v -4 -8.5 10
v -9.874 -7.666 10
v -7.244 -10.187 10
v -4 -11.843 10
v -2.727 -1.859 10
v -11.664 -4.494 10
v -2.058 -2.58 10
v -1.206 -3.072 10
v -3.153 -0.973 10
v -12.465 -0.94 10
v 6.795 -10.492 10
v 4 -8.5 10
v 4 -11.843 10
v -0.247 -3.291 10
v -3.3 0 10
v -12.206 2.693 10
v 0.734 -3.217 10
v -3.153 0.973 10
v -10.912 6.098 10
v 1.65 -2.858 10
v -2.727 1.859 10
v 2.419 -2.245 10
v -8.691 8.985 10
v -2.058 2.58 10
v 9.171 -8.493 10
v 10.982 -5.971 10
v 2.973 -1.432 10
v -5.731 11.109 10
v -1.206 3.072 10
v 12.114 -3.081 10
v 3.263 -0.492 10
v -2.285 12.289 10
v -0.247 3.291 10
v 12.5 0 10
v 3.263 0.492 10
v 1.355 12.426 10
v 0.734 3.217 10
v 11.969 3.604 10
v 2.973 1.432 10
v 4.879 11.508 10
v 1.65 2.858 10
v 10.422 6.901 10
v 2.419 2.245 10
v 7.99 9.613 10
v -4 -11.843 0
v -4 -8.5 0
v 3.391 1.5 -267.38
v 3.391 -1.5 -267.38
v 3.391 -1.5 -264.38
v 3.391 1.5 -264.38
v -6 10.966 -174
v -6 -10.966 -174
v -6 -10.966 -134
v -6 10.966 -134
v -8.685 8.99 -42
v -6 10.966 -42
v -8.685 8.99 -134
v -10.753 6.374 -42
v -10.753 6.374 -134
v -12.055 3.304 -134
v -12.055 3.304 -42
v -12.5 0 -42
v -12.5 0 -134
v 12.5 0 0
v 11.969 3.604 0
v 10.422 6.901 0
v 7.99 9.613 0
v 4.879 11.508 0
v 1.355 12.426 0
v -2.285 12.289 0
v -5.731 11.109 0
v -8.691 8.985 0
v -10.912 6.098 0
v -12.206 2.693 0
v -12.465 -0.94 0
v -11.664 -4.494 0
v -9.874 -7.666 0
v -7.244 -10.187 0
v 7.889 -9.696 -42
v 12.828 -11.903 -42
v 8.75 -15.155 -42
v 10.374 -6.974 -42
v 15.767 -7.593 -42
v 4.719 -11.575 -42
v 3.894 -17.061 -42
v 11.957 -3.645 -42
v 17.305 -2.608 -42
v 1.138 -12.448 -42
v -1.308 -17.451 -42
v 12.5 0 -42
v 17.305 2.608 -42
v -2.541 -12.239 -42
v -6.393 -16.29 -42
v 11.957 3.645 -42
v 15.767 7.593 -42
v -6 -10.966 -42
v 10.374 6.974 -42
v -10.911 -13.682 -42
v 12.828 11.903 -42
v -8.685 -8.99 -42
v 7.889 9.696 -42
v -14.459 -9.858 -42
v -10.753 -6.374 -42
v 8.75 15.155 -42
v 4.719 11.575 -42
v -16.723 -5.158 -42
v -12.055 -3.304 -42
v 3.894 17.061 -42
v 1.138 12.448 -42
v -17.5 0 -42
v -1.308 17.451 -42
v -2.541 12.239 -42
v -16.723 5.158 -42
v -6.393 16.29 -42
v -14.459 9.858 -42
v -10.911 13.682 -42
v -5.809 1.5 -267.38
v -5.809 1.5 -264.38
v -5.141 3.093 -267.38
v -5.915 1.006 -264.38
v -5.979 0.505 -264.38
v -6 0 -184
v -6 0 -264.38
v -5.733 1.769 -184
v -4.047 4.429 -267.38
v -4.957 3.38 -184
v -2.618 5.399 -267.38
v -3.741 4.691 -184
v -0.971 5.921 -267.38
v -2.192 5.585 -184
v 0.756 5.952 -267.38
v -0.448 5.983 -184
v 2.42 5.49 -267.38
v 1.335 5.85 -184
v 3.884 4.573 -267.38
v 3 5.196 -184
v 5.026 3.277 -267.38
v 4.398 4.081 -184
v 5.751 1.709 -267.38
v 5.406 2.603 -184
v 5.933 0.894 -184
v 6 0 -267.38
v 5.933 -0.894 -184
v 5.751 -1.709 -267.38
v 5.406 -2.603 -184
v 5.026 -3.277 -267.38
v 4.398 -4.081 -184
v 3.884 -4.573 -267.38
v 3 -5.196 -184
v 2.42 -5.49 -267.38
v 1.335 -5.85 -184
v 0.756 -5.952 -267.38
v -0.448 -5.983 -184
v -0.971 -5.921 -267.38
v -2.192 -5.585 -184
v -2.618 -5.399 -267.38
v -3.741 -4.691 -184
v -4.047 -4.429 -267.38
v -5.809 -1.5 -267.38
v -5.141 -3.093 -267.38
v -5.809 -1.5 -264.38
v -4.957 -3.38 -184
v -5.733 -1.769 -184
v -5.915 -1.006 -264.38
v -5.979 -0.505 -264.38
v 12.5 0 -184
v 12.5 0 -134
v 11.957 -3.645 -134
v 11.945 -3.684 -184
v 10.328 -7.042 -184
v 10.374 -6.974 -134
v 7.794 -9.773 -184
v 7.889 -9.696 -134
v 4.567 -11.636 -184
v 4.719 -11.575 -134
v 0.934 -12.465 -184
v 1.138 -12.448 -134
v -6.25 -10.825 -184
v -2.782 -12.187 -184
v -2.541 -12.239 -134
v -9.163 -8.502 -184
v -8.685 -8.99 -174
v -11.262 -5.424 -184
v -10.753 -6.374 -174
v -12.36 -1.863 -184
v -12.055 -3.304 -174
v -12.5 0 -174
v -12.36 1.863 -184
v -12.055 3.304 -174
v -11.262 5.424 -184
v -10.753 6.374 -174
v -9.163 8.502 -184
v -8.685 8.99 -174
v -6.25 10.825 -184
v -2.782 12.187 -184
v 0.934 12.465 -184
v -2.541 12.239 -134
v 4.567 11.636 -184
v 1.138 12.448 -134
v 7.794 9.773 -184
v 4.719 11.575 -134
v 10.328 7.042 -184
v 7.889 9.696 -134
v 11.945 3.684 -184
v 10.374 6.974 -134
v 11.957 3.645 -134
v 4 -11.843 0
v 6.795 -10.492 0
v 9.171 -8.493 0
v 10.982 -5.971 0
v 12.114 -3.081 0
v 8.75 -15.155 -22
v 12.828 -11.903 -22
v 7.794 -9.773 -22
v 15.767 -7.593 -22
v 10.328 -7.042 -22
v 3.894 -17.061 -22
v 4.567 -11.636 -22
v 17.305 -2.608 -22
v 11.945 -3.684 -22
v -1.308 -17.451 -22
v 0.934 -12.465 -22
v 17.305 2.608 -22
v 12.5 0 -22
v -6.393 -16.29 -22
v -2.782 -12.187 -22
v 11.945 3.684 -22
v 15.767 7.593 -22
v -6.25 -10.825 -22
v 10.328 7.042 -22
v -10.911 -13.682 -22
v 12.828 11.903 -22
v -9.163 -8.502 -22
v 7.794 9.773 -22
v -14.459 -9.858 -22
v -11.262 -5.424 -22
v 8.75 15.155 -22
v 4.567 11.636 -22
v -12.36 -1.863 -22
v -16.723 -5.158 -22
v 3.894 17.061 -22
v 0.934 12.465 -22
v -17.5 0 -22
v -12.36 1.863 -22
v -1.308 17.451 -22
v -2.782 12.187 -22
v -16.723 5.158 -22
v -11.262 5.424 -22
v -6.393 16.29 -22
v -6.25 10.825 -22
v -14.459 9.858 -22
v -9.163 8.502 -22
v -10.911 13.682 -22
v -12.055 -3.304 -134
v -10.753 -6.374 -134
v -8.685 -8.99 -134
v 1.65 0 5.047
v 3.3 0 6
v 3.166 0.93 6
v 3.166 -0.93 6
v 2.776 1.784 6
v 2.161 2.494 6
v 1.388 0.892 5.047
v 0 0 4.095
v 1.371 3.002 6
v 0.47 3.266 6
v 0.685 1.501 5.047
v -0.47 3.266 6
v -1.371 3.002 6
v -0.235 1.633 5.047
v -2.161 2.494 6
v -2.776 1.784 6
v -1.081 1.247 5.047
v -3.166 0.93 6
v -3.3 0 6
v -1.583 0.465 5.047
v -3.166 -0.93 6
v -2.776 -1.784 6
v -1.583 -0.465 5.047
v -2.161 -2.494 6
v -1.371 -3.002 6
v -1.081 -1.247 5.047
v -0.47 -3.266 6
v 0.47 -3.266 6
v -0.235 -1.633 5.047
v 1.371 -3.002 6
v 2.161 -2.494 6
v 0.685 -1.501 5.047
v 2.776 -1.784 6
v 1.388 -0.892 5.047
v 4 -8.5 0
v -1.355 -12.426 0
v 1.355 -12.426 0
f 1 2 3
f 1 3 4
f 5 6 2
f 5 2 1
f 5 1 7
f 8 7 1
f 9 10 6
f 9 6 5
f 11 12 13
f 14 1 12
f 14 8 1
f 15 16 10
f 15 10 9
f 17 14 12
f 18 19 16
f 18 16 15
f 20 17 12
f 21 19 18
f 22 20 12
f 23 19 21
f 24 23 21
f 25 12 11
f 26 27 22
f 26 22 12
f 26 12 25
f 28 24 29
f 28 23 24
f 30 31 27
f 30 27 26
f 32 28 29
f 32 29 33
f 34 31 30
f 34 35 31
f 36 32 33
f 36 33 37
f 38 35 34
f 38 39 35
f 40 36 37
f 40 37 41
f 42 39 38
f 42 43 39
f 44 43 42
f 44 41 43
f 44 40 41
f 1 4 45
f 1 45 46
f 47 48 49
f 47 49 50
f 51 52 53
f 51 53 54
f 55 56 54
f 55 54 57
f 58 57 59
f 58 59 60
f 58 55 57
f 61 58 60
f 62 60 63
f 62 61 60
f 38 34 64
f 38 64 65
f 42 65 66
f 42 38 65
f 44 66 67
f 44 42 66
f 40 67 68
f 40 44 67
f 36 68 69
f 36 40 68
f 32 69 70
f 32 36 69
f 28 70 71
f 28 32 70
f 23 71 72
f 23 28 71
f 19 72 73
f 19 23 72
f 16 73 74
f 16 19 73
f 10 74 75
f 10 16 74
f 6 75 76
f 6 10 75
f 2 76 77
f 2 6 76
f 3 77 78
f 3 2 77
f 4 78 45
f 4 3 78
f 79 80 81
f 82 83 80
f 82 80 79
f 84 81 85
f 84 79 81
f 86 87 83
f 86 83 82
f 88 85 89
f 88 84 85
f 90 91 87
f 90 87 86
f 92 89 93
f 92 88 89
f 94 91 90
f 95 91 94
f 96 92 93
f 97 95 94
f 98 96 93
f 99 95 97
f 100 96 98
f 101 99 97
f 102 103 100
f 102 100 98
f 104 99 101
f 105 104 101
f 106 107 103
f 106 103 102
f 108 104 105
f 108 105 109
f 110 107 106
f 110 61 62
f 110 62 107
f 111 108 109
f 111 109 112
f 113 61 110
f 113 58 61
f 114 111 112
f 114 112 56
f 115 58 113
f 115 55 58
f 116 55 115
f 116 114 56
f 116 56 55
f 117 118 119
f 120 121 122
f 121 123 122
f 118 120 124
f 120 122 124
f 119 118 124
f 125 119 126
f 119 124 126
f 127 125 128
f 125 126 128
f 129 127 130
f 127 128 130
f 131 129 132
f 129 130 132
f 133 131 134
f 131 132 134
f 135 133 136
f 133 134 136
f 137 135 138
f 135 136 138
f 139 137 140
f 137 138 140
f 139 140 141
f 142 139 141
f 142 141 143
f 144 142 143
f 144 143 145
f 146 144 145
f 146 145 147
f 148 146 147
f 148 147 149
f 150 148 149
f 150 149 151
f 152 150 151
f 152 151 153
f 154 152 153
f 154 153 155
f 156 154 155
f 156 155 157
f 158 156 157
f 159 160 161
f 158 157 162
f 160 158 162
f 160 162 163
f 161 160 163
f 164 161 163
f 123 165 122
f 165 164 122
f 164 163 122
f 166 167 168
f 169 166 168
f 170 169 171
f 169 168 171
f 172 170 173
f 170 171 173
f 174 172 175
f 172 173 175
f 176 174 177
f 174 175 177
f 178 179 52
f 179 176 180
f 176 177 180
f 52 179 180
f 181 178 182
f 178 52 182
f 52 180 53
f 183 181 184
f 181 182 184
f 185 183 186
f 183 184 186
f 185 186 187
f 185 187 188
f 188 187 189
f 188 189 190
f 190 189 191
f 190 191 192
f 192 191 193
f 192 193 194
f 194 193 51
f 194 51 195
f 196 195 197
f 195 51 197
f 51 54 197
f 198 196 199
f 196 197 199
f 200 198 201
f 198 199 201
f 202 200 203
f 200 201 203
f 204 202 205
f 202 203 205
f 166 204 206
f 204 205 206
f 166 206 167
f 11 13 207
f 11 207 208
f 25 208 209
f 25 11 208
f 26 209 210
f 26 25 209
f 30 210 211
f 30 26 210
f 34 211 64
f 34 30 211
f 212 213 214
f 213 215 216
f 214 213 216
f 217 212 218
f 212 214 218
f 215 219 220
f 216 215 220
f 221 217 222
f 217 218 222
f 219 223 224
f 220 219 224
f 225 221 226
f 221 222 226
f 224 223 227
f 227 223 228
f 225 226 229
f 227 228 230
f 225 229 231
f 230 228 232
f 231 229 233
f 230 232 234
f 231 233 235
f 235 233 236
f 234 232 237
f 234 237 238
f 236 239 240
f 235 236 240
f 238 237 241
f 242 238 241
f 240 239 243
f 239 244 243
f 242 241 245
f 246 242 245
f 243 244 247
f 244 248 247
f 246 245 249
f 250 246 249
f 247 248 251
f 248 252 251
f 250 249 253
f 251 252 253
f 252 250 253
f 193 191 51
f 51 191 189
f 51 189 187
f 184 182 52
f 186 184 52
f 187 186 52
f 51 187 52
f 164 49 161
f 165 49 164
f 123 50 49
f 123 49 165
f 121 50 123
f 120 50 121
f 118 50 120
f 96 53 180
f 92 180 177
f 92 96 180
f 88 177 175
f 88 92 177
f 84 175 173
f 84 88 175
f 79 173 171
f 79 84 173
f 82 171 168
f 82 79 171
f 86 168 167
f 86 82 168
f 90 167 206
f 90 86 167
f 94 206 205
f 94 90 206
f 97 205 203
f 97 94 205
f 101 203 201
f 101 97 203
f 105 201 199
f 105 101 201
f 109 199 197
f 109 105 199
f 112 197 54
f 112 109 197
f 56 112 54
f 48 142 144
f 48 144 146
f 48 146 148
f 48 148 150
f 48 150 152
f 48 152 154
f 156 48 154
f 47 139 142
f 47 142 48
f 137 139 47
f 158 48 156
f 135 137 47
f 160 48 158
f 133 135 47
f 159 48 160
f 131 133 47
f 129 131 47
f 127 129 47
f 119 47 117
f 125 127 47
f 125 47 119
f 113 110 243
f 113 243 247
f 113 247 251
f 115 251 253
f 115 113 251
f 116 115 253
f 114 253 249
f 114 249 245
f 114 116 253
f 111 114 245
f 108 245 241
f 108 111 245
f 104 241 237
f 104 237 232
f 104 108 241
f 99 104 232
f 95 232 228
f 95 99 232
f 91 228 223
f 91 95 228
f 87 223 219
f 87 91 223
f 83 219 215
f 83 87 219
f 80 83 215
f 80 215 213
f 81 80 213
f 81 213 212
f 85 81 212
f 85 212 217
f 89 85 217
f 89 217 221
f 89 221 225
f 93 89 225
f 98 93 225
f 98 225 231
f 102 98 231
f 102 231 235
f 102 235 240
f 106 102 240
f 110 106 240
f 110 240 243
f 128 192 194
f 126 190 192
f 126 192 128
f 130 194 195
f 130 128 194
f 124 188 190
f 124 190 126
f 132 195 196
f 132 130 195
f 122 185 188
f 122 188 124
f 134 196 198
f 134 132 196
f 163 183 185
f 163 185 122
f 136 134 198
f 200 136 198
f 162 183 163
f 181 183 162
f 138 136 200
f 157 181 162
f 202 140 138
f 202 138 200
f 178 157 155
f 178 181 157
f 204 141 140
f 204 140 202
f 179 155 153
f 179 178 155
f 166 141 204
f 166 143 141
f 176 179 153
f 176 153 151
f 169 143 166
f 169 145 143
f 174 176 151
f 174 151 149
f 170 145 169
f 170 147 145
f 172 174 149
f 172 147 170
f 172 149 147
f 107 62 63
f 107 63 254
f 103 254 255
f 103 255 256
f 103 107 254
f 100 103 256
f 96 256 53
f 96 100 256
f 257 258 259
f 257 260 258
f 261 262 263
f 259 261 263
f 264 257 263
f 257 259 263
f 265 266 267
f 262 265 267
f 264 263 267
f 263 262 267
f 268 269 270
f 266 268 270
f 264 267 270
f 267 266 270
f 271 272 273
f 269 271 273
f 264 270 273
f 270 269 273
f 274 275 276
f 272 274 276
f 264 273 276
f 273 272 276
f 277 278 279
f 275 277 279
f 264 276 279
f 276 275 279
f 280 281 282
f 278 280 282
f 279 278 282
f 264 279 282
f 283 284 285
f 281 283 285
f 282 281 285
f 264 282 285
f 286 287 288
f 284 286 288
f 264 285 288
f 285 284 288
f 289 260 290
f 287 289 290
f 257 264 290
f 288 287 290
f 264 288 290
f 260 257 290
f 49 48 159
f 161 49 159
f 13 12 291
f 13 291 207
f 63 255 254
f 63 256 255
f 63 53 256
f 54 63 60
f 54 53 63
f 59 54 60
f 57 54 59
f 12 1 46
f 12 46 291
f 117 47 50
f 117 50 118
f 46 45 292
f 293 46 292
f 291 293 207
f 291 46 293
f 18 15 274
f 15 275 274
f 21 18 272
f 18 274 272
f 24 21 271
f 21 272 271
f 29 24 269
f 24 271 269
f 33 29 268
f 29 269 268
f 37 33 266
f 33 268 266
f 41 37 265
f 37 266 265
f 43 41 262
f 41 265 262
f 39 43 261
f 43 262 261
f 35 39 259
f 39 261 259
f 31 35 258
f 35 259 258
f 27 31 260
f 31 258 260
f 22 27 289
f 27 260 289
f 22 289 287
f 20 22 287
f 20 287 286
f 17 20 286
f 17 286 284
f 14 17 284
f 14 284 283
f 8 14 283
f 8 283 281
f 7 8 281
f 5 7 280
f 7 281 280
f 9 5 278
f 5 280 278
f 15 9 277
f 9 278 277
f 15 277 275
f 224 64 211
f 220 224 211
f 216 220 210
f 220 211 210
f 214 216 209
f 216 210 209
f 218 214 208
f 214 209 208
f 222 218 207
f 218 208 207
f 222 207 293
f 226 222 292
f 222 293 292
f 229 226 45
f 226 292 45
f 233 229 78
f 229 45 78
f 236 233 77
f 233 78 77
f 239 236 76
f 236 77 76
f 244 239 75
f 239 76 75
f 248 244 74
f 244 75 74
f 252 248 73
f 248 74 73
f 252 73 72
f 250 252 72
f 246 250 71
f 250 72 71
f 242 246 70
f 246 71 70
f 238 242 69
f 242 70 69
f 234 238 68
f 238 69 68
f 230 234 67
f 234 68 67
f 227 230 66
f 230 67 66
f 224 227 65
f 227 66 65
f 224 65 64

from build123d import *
from build123d.topology import SkipClean

# Parameters (mm, degrees)
ESQUISSE1_R                                = 30
BOSS_EXTRU_1_DEPTH                         = 15
ESQUISSE2_R                                = 12.5
BOSS_EXTRU_2_DEPTH                         = 184
ESQUISSE4_2_W                              = 230
ESQUISSE4_2_H                              = 40
ENL_V_MAT_EXTRU_1_DEPTH                    = 5
CHAMBRAGE_POUR_VIS_T_TE_HEXAGONALE_2_COUNT = 2
CHAMBRAGE_POUR_VIS_T_TE_HEXAGONALE_2_PITCH = 41
ESQUISSE17_R                               = 6
BOSS_EXTRU_4_DEPTH                         = 83.38
ESQUISSE18_W                               = 10.356322474
ESQUISSE18_H                               = 3
ENL_V_MAT_EXTRU_2_DEPTH                    = 3
ESQUISSE19_W                               = 7.933443835
ESQUISSE19_H                               = 21.9317122
ENL_V_MAT_EXTRU_3_DEPTH                    = 50
BOSS_EXTRU_6_START                         = -10
ESQUISSE21_R                               = 12.5
BOSS_EXTRU_6_DEPTH                         = 10
ESQUISSE26_R                               = 17.5
BOSS_EXTRU_8_DEPTH                         = 112
ENL_V_START                                = -92
ESQUISSE27_R                               = 17.5
ENL_V_MAT_EXTRU_5_DEPTH                    = 92
ENL_V_START_2                              = -15
ESQUISSE28_R                               = 30
ENL_V_MAT_EXTRU_6_DEPTH                    = 15
BOSS_EXTRU_9_START                         = 10
BOSS_EXTRU_9_DEPTH                         = 10
D_GAGEMENT_M61_D                           = 6.6
D_GAGEMENT_M61_DEPTH                       = 4
D_GAGEMENT_M61_TIP                         = 1.905255888


with BuildPart() as part:
    # Esquisse1 → Boss.-Extru.1 (new body)
    with BuildSketch(Plane.XY):
        Circle(ESQUISSE1_R)
    extrude(amount=BOSS_EXTRU_1_DEPTH)

    # Esquisse2 → Boss.-Extru.2 (add)
    with BuildSketch(Plane(origin=(0, 0, 0), x_dir=(-1, 0, 0), z_dir=(0, 0, -1))):
        Circle(ESQUISSE2_R)
    extrude(amount=BOSS_EXTRU_2_DEPTH)

    # Esquisse4<2> → Enlèv. mat.-Extru.1 (cut)
    with BuildSketch(Plane.XY.offset(15)):
        Rectangle(ESQUISSE4_2_W, ESQUISSE4_2_H)
    extrude(amount=-ENL_V_MAT_EXTRU_1_DEPTH, mode=Mode.SUBTRACT)

    # Esquisse14 → Chambrage pour vis à tête hexagonale M51 (revolve, cut)
    with BuildSketch(Plane.YZ.offset(-20.5)):
        Polygon((0, 0), (0, 15), (2.75, 15), (2.75, 3.605), (2.775, 3.58), (6.12, 3.58), (6.12, 0), align=None)
    chambrage_pour_vis_t_te_hexagonale_m51 = revolve(axis=Axis((-20.5, 0, -6.35), (0, 0, 1)), mode=Mode.SUBTRACT)

    # Chambrage pour vis _ t_te hexagonale 2: Chambrage pour vis à tête hexagonale M51 ×2
    with Locations(*[(i * CHAMBRAGE_POUR_VIS_T_TE_HEXAGONALE_2_PITCH, 0, 0) for i in range(1, CHAMBRAGE_POUR_VIS_T_TE_HEXAGONALE_2_COUNT)]):
        add(chambrage_pour_vis_t_te_hexagonale_m51, mode=Mode.SUBTRACT)

    # Esquisse17 → Boss.-Extru.4 (add)
    with BuildSketch(Plane(origin=(0, 0, -184), x_dir=(-1, 0, 0), z_dir=(0, 0, -1))):
        Circle(ESQUISSE17_R)
    extrude(amount=BOSS_EXTRU_4_DEPTH)

    # Esquisse18 → Enlèv. mat.-Extru.2 (cut)
    with BuildSketch(Plane(origin=(0, 0, -267.38), x_dir=(-1, 0, 0), z_dir=(0, 0, -1))):
        with Locations((1.787207702, 0)):
            Rectangle(ESQUISSE18_W, ESQUISSE18_H)
    extrude(amount=-ENL_V_MAT_EXTRU_2_DEPTH, mode=Mode.SUBTRACT)

    # Esquisse19 → Enlèv. mat.-Extru.3 (cut)
    with BuildSketch(Plane(origin=(0, 0, -184), x_dir=(-1, 0, 0), z_dir=(0, 0, -1))):
        with Locations((9.966721917, 0)):
            Rectangle(ESQUISSE19_W, ESQUISSE19_H)
    extrude(amount=-ENL_V_MAT_EXTRU_3_DEPTH, mode=Mode.SUBTRACT)

    # Esquisse21 → Boss.-Extru.6 (add)
    with BuildSketch(Plane(origin=(0, 0, -184), x_dir=(-1, 0, 0), z_dir=(0, 0, -1)).offset(BOSS_EXTRU_6_START)):
        Circle(ESQUISSE21_R)
    extrude(amount=BOSS_EXTRU_6_DEPTH)

    # Esquisse26 → Boss.-Extru.8 (add)
    with BuildSketch(Plane(origin=(0, 0, -134), x_dir=(-1, 0, 0), z_dir=(0, 0, -1))):
        Circle(ESQUISSE26_R)
    extrude(amount=-BOSS_EXTRU_8_DEPTH)

    # Esquisse27 → Enlèv. mat.-Extru.5 (cut)
    with BuildSketch(Plane(origin=(0, 0, -134), x_dir=(-1, 0, 0), z_dir=(0, 0, -1)).offset(ENL_V_START)):
        Circle(ESQUISSE27_R)
        with BuildLine():
            ThreePointArc((6, 10.9658561), (10.752906584, 6.373774392), (12.5, 0))
            ThreePointArc((12.5, 0), (10.752906584, -6.373774392), (6, -10.9658561))
            ThreePointArc((6, -10.9658561), (-12.5, 0), (6, 10.9658561))
        make_face(mode=Mode.SUBTRACT)
    extrude(amount=ENL_V_MAT_EXTRU_5_DEPTH, mode=Mode.SUBTRACT)

    # Esquisse28 → Enlèv. mat.-Extru.6 (cut)
    with BuildSketch(Plane.XY.offset(15).offset(ENL_V_START_2)):
        Circle(ESQUISSE28_R)
    extrude(amount=ENL_V_MAT_EXTRU_6_DEPTH, mode=Mode.SUBTRACT)

    # Esquisse29 → Boss.-Extru.9 (add)
    with SkipClean():  # the faces are left unmerged after this step: merging them gives an invalid solid
        with BuildSketch(Plane.XY.offset(BOSS_EXTRU_9_START)):
            with BuildLine():
                Line((-4, -11.842719282), (-4, -8.5))
                Line((-4, -8.5), (4, -8.5))
                Line((4, -8.5), (4, -11.842719282))
                ThreePointArc((4, -11.842719282), (10.155048006, -7.288689869), (12.5, 0))
                ThreePointArc((12.5, 0), (-7.288689869, 10.155048006), (-4, -11.842719282))
            make_face()
        extrude(amount=-BOSS_EXTRU_9_DEPTH)

    # Dégagement M61
    with Locations(Plane.XY.offset(10)):
        with Locations((0, 0)):
            Hole(D_GAGEMENT_M61_D / 2, depth=D_GAGEMENT_M61_DEPTH)
            with Locations((0, 0, -(D_GAGEMENT_M61_DEPTH + D_GAGEMENT_M61_TIP / 2))):  # 120° drill point
                Cone(0, D_GAGEMENT_M61_D / 2, D_GAGEMENT_M61_TIP, mode=Mode.SUBTRACT)


solid = part.part
